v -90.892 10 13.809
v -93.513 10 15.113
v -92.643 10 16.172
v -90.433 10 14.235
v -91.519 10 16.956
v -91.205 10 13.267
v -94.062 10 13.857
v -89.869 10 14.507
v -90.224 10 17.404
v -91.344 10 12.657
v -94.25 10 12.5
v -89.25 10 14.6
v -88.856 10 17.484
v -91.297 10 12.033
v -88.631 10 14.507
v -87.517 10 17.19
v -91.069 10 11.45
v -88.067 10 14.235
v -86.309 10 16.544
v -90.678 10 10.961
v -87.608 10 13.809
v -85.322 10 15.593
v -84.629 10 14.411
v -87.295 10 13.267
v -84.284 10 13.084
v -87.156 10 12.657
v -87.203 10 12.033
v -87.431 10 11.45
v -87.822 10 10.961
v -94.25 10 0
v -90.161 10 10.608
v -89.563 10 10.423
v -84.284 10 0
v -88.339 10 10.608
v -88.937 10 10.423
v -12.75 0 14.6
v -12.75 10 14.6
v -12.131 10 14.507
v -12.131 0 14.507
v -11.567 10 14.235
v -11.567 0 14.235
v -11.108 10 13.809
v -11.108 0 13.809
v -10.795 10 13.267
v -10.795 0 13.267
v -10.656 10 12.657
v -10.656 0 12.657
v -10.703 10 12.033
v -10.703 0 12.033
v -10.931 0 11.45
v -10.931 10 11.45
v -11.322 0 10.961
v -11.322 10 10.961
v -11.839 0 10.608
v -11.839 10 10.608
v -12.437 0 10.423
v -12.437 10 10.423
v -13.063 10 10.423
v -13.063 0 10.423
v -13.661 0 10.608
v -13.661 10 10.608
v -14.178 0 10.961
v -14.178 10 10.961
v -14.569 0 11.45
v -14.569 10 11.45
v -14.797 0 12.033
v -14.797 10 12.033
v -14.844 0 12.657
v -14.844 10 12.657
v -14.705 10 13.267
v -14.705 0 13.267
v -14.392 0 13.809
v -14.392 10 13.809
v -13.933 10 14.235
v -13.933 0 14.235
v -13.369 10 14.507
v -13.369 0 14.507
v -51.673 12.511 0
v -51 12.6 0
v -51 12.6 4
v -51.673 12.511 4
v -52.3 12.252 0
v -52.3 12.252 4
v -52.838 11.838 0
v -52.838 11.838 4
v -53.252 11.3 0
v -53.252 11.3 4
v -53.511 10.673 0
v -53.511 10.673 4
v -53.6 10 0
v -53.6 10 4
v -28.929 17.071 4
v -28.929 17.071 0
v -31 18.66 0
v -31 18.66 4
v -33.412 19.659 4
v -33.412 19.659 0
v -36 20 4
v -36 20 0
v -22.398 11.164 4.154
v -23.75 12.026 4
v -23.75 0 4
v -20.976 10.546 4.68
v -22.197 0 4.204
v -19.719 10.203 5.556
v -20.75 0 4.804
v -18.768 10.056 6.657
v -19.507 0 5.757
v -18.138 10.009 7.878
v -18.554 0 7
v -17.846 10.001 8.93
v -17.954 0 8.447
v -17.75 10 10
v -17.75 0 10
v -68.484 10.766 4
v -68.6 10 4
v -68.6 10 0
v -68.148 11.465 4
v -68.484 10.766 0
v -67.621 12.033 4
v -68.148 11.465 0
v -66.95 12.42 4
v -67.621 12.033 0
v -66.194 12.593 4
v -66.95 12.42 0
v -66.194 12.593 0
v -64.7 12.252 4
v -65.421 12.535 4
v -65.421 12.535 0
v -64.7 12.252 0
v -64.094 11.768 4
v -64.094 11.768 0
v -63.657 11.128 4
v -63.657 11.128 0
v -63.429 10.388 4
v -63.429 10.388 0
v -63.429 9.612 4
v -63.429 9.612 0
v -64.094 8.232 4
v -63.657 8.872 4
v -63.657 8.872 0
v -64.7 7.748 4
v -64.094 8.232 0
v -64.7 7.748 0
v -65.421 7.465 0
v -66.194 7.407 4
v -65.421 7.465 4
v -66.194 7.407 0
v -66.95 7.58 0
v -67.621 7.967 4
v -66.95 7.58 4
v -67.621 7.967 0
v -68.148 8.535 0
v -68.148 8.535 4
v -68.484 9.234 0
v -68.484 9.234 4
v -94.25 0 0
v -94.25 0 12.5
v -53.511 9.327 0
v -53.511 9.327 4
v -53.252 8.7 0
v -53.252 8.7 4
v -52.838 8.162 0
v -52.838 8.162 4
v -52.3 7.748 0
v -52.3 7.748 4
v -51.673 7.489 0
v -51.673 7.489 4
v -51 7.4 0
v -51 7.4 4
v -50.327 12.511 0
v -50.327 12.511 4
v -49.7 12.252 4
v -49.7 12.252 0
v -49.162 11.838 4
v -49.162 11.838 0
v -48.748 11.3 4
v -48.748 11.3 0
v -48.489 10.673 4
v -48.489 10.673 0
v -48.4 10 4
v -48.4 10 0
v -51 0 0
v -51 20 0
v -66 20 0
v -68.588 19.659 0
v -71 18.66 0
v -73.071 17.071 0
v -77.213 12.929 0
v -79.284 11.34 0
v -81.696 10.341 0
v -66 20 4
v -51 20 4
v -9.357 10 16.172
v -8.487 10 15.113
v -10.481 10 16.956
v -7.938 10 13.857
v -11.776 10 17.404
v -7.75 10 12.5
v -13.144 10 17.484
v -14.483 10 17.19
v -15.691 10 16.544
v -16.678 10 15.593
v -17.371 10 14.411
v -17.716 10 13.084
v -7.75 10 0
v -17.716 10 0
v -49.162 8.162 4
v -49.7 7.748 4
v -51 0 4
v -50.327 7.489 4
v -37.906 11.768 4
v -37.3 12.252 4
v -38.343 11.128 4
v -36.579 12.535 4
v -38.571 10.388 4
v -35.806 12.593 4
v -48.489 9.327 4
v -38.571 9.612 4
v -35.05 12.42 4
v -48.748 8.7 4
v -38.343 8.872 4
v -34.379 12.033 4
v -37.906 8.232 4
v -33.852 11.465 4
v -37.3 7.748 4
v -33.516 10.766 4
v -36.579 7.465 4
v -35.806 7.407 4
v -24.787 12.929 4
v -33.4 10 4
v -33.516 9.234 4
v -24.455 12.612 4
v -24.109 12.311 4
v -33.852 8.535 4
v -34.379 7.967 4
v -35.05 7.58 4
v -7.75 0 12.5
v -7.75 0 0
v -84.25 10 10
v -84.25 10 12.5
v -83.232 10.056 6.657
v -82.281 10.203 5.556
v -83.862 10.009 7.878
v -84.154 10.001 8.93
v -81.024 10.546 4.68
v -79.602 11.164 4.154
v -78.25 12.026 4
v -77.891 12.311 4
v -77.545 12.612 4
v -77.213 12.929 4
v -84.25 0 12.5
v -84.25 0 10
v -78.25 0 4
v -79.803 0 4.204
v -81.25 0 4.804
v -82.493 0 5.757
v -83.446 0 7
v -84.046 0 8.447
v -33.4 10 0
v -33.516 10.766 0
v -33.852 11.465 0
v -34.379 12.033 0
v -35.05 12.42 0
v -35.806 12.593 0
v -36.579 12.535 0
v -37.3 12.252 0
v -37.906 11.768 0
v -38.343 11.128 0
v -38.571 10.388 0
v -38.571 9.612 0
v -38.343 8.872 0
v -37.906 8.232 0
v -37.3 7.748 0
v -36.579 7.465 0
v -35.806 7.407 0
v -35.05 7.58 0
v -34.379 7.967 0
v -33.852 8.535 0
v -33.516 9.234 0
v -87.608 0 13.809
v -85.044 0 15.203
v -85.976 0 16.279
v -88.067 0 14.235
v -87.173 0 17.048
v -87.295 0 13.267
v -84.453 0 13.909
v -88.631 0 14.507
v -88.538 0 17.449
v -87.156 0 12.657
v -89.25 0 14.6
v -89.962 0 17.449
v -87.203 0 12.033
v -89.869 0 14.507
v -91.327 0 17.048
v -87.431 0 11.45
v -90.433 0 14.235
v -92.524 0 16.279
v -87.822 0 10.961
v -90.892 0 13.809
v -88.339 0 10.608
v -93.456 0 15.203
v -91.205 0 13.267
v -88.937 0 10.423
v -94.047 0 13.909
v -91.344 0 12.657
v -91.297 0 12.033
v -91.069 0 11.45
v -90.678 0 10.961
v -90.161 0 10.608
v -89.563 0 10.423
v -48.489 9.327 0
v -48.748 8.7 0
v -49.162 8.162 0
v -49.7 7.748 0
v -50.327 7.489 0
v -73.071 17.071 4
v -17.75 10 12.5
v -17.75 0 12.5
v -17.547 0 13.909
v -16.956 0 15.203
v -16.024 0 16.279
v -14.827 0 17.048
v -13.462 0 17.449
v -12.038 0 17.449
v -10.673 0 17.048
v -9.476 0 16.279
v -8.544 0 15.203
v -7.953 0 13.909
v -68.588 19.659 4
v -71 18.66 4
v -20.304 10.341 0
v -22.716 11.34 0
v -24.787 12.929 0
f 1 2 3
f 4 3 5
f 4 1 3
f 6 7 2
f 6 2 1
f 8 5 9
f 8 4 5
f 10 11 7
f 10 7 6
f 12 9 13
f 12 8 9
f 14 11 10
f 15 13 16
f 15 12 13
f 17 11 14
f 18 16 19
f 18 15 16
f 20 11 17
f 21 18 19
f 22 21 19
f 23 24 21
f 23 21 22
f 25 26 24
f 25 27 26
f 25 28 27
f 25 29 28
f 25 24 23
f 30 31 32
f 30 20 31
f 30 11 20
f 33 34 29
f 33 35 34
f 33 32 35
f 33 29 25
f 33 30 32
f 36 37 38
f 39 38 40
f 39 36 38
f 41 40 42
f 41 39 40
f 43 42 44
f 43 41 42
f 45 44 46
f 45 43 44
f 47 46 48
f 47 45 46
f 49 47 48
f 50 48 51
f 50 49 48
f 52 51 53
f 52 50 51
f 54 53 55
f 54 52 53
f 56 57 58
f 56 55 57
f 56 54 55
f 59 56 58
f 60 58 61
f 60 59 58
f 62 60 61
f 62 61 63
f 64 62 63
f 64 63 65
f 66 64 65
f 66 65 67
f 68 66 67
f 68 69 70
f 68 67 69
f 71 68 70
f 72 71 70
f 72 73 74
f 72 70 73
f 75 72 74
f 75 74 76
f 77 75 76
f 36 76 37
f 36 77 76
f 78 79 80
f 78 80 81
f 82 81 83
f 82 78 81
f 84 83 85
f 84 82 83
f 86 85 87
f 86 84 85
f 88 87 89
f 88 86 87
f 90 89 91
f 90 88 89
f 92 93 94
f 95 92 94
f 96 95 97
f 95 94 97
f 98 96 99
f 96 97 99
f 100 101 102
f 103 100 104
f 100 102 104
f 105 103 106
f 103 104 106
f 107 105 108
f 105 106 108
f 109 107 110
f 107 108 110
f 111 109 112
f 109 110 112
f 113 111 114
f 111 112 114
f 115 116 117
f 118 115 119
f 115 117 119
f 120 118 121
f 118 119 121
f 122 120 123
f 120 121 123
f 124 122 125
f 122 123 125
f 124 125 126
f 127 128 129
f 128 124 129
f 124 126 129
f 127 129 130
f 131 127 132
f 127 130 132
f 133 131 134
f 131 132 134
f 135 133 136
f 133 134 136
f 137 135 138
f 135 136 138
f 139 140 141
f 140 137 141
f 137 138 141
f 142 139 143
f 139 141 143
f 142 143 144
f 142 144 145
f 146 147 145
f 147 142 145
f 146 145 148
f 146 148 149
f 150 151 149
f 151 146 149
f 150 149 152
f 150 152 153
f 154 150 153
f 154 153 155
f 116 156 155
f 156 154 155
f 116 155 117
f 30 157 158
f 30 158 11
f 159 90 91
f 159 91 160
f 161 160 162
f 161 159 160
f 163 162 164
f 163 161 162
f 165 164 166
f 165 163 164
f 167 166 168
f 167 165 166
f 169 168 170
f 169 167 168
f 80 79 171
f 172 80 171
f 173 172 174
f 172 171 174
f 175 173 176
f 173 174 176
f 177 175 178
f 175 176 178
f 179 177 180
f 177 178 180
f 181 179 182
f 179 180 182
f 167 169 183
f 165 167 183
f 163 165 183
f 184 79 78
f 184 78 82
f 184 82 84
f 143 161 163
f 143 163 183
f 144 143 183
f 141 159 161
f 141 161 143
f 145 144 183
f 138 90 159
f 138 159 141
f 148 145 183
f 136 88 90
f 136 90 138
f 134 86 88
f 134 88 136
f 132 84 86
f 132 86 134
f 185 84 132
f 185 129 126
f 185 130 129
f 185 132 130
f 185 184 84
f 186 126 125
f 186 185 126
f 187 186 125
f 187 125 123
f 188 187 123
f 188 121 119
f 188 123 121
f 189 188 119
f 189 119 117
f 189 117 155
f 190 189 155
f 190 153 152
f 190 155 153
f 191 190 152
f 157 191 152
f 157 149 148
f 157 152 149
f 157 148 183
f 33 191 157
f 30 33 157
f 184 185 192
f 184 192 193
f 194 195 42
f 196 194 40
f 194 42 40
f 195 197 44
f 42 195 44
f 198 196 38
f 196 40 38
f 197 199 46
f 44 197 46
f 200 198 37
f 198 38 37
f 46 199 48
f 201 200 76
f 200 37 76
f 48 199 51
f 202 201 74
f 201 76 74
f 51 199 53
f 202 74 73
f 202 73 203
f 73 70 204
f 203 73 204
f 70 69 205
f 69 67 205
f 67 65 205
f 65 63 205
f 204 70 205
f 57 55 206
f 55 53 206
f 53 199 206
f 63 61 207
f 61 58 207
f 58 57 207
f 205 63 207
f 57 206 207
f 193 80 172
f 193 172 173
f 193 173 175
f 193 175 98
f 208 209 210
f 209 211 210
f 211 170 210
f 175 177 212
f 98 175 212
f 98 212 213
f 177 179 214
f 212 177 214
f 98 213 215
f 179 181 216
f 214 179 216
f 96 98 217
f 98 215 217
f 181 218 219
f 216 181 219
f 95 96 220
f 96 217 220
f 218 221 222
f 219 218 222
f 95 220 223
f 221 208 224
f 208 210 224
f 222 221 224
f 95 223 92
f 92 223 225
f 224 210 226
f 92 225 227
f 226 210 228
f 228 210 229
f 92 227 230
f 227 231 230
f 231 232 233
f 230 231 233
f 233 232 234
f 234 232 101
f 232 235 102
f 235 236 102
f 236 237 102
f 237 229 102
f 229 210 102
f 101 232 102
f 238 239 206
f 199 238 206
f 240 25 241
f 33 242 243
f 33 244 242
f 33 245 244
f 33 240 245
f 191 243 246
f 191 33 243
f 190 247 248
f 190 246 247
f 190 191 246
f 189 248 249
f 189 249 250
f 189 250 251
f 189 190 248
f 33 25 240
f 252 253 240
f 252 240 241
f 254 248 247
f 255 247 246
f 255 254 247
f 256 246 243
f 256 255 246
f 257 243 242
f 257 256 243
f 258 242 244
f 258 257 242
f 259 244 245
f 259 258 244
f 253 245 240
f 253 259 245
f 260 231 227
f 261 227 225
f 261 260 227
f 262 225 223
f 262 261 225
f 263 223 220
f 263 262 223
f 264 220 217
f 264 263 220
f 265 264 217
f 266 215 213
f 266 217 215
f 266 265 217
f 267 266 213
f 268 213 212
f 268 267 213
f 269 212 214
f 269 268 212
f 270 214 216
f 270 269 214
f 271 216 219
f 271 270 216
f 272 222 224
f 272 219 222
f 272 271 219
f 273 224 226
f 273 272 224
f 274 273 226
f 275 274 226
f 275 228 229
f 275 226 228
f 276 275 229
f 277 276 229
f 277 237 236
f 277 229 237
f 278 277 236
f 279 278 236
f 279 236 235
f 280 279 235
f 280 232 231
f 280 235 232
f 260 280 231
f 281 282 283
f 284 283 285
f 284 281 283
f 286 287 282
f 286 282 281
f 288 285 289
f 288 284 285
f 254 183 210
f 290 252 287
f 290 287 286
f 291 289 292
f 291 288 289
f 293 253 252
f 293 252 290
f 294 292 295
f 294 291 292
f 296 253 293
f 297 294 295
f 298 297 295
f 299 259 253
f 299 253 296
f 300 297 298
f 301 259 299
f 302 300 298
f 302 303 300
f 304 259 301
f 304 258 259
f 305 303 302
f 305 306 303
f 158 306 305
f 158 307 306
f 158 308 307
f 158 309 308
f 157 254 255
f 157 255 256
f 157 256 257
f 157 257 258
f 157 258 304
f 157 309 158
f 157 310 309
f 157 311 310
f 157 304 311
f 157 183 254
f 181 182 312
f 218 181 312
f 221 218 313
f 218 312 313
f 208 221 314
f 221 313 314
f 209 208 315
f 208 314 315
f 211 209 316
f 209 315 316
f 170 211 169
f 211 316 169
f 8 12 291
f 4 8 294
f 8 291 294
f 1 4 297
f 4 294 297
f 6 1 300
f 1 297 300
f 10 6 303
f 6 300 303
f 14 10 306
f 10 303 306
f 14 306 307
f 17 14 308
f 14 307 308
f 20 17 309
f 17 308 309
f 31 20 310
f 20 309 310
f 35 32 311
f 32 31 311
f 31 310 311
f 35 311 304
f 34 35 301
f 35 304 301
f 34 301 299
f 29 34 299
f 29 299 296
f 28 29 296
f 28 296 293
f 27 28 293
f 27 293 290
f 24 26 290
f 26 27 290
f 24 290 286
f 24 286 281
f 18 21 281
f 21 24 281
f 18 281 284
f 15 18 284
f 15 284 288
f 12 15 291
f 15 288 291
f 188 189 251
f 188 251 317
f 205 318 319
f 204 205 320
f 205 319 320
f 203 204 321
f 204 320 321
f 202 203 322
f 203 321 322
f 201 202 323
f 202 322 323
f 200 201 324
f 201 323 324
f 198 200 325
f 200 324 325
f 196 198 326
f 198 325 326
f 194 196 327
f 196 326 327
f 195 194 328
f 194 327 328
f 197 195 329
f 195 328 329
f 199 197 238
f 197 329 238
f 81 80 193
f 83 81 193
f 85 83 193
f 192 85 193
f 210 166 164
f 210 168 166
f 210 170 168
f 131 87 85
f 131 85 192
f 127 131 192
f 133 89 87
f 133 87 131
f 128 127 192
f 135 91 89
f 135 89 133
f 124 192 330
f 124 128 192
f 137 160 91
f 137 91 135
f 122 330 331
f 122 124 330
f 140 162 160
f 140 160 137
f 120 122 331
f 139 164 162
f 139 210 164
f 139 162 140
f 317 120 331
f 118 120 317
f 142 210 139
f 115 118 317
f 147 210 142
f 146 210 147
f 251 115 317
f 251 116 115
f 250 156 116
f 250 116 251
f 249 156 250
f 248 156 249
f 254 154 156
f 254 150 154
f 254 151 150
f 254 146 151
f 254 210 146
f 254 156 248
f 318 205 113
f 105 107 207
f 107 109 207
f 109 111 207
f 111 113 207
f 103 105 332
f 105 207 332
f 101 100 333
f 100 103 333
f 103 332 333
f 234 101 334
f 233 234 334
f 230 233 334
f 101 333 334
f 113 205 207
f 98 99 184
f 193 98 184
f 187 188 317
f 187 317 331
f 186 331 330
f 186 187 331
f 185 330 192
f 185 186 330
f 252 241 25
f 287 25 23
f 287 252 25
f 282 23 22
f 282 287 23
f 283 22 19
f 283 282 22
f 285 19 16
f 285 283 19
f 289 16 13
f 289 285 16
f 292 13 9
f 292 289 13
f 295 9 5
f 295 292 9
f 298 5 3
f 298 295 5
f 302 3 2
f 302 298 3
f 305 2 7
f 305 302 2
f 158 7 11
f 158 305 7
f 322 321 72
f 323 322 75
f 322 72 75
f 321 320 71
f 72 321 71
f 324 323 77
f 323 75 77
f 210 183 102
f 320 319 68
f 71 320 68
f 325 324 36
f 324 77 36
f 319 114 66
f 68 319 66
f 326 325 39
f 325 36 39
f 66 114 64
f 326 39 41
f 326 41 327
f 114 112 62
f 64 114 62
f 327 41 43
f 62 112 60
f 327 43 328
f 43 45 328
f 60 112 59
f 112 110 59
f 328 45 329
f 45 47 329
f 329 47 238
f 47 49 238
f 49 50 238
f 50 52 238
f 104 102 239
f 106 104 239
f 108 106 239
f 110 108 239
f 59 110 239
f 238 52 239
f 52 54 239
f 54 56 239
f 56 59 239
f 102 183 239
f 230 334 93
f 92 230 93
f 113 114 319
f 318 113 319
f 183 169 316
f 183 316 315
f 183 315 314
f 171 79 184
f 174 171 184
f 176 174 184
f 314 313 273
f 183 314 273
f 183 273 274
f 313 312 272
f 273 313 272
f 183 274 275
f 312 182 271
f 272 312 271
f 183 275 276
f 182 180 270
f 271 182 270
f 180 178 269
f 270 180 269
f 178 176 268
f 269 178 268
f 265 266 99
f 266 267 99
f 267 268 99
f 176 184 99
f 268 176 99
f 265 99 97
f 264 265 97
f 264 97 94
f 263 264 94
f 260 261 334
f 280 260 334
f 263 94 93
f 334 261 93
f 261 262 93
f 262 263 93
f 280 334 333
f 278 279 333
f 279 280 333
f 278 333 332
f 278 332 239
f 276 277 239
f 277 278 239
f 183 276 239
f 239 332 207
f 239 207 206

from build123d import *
from build123d.topology import SkipClean

# Parameters (mm, degrees)
SKETCH1_R           = 2.1
BOSS_EXTRUDE1_DEPTH = 20
SKETCH3_R           = 2.6
BOSS_EXTRUDE2_DEPTH = 17.5


with BuildPart() as part:
    # Sketch1 → Boss-Extrude1 (new body)
    with BuildSketch(Plane(origin=(0, 0, 0), x_dir=(1, 0, 0), z_dir=(0, 1, 0))):
        with BuildLine():
            Line((-7.75, -12.5), (-7.75, 0))
            Line((-7.75, 0), (-51, 0))
            Line((-51, 0), (-51, -4))
            Line((-51, -4), (-23.75, -4))
            ThreePointArc((-23.75, -4), (-19.507359313, -5.757359313), (-17.75, -10))
            Line((-17.75, -10), (-17.75, -12.5))
            ThreePointArc((-17.75, -12.5), (-12.75, -17.5), (-7.75, -12.5))
        make_face()
        with Locations(Location((-12.75, -12.5, 0), (0, 0, 270))):
            Circle(SKETCH1_R, mode=Mode.SUBTRACT)
    extrude(amount=BOSS_EXTRUDE1_DEPTH)


with BuildPart() as body_2:
    # Sketch3 → Boss-Extrude2 (new, through all)
    with BuildSketch(Plane.XY):
        with BuildLine():
            Line((-51, 0), (-7.75, 0))
            Line((-7.75, 0), (-7.75, 10))
            Line((-7.75, 10), (-17.715728753, 10))
            ThreePointArc((-17.715728753, 10), (-21.542563076, 10.761204675), (-24.786796564, 12.928932188))
            Line((-24.786796564, 12.928932188), (-28.928932188, 17.071067812))
            ThreePointArc((-28.928932188, 17.071067812), (-32.173165676, 19.238795325), (-36, 20))
            Line((-36, 20), (-51, 20))
            Line((-51, 20), (-51, 12.6))
            ThreePointArc((-51, 12.6), (-49.161522369, 11.838477631), (-48.4, 10))
            ThreePointArc((-48.4, 10), (-49.161522369, 8.161522369), (-51, 7.4))
            Line((-51, 7.4), (-51, 0))
        make_face()
        with Locations((-36, 10)):
            Circle(SKETCH3_R, mode=Mode.SUBTRACT)
    extrude(amount=BOSS_EXTRUDE2_DEPTH)

    # Intersect1: read off the stored shape, not the designer's step
    # Intersect1: intersect part
    add(part.part, mode=Mode.INTERSECT)

    # Mirror1: body 2 across face


with BuildPart() as body_2_1:
    with SkipClean():  # the faces are left unmerged after this step: merging them gives an invalid solid
        add(body_2.part)
        add(body_2.part.mirror(Plane(origin=(-51, 16.3, 2), x_dir=(0, 0, 1), z_dir=(-1, 0, 0))))


solid = body_2_1.part
